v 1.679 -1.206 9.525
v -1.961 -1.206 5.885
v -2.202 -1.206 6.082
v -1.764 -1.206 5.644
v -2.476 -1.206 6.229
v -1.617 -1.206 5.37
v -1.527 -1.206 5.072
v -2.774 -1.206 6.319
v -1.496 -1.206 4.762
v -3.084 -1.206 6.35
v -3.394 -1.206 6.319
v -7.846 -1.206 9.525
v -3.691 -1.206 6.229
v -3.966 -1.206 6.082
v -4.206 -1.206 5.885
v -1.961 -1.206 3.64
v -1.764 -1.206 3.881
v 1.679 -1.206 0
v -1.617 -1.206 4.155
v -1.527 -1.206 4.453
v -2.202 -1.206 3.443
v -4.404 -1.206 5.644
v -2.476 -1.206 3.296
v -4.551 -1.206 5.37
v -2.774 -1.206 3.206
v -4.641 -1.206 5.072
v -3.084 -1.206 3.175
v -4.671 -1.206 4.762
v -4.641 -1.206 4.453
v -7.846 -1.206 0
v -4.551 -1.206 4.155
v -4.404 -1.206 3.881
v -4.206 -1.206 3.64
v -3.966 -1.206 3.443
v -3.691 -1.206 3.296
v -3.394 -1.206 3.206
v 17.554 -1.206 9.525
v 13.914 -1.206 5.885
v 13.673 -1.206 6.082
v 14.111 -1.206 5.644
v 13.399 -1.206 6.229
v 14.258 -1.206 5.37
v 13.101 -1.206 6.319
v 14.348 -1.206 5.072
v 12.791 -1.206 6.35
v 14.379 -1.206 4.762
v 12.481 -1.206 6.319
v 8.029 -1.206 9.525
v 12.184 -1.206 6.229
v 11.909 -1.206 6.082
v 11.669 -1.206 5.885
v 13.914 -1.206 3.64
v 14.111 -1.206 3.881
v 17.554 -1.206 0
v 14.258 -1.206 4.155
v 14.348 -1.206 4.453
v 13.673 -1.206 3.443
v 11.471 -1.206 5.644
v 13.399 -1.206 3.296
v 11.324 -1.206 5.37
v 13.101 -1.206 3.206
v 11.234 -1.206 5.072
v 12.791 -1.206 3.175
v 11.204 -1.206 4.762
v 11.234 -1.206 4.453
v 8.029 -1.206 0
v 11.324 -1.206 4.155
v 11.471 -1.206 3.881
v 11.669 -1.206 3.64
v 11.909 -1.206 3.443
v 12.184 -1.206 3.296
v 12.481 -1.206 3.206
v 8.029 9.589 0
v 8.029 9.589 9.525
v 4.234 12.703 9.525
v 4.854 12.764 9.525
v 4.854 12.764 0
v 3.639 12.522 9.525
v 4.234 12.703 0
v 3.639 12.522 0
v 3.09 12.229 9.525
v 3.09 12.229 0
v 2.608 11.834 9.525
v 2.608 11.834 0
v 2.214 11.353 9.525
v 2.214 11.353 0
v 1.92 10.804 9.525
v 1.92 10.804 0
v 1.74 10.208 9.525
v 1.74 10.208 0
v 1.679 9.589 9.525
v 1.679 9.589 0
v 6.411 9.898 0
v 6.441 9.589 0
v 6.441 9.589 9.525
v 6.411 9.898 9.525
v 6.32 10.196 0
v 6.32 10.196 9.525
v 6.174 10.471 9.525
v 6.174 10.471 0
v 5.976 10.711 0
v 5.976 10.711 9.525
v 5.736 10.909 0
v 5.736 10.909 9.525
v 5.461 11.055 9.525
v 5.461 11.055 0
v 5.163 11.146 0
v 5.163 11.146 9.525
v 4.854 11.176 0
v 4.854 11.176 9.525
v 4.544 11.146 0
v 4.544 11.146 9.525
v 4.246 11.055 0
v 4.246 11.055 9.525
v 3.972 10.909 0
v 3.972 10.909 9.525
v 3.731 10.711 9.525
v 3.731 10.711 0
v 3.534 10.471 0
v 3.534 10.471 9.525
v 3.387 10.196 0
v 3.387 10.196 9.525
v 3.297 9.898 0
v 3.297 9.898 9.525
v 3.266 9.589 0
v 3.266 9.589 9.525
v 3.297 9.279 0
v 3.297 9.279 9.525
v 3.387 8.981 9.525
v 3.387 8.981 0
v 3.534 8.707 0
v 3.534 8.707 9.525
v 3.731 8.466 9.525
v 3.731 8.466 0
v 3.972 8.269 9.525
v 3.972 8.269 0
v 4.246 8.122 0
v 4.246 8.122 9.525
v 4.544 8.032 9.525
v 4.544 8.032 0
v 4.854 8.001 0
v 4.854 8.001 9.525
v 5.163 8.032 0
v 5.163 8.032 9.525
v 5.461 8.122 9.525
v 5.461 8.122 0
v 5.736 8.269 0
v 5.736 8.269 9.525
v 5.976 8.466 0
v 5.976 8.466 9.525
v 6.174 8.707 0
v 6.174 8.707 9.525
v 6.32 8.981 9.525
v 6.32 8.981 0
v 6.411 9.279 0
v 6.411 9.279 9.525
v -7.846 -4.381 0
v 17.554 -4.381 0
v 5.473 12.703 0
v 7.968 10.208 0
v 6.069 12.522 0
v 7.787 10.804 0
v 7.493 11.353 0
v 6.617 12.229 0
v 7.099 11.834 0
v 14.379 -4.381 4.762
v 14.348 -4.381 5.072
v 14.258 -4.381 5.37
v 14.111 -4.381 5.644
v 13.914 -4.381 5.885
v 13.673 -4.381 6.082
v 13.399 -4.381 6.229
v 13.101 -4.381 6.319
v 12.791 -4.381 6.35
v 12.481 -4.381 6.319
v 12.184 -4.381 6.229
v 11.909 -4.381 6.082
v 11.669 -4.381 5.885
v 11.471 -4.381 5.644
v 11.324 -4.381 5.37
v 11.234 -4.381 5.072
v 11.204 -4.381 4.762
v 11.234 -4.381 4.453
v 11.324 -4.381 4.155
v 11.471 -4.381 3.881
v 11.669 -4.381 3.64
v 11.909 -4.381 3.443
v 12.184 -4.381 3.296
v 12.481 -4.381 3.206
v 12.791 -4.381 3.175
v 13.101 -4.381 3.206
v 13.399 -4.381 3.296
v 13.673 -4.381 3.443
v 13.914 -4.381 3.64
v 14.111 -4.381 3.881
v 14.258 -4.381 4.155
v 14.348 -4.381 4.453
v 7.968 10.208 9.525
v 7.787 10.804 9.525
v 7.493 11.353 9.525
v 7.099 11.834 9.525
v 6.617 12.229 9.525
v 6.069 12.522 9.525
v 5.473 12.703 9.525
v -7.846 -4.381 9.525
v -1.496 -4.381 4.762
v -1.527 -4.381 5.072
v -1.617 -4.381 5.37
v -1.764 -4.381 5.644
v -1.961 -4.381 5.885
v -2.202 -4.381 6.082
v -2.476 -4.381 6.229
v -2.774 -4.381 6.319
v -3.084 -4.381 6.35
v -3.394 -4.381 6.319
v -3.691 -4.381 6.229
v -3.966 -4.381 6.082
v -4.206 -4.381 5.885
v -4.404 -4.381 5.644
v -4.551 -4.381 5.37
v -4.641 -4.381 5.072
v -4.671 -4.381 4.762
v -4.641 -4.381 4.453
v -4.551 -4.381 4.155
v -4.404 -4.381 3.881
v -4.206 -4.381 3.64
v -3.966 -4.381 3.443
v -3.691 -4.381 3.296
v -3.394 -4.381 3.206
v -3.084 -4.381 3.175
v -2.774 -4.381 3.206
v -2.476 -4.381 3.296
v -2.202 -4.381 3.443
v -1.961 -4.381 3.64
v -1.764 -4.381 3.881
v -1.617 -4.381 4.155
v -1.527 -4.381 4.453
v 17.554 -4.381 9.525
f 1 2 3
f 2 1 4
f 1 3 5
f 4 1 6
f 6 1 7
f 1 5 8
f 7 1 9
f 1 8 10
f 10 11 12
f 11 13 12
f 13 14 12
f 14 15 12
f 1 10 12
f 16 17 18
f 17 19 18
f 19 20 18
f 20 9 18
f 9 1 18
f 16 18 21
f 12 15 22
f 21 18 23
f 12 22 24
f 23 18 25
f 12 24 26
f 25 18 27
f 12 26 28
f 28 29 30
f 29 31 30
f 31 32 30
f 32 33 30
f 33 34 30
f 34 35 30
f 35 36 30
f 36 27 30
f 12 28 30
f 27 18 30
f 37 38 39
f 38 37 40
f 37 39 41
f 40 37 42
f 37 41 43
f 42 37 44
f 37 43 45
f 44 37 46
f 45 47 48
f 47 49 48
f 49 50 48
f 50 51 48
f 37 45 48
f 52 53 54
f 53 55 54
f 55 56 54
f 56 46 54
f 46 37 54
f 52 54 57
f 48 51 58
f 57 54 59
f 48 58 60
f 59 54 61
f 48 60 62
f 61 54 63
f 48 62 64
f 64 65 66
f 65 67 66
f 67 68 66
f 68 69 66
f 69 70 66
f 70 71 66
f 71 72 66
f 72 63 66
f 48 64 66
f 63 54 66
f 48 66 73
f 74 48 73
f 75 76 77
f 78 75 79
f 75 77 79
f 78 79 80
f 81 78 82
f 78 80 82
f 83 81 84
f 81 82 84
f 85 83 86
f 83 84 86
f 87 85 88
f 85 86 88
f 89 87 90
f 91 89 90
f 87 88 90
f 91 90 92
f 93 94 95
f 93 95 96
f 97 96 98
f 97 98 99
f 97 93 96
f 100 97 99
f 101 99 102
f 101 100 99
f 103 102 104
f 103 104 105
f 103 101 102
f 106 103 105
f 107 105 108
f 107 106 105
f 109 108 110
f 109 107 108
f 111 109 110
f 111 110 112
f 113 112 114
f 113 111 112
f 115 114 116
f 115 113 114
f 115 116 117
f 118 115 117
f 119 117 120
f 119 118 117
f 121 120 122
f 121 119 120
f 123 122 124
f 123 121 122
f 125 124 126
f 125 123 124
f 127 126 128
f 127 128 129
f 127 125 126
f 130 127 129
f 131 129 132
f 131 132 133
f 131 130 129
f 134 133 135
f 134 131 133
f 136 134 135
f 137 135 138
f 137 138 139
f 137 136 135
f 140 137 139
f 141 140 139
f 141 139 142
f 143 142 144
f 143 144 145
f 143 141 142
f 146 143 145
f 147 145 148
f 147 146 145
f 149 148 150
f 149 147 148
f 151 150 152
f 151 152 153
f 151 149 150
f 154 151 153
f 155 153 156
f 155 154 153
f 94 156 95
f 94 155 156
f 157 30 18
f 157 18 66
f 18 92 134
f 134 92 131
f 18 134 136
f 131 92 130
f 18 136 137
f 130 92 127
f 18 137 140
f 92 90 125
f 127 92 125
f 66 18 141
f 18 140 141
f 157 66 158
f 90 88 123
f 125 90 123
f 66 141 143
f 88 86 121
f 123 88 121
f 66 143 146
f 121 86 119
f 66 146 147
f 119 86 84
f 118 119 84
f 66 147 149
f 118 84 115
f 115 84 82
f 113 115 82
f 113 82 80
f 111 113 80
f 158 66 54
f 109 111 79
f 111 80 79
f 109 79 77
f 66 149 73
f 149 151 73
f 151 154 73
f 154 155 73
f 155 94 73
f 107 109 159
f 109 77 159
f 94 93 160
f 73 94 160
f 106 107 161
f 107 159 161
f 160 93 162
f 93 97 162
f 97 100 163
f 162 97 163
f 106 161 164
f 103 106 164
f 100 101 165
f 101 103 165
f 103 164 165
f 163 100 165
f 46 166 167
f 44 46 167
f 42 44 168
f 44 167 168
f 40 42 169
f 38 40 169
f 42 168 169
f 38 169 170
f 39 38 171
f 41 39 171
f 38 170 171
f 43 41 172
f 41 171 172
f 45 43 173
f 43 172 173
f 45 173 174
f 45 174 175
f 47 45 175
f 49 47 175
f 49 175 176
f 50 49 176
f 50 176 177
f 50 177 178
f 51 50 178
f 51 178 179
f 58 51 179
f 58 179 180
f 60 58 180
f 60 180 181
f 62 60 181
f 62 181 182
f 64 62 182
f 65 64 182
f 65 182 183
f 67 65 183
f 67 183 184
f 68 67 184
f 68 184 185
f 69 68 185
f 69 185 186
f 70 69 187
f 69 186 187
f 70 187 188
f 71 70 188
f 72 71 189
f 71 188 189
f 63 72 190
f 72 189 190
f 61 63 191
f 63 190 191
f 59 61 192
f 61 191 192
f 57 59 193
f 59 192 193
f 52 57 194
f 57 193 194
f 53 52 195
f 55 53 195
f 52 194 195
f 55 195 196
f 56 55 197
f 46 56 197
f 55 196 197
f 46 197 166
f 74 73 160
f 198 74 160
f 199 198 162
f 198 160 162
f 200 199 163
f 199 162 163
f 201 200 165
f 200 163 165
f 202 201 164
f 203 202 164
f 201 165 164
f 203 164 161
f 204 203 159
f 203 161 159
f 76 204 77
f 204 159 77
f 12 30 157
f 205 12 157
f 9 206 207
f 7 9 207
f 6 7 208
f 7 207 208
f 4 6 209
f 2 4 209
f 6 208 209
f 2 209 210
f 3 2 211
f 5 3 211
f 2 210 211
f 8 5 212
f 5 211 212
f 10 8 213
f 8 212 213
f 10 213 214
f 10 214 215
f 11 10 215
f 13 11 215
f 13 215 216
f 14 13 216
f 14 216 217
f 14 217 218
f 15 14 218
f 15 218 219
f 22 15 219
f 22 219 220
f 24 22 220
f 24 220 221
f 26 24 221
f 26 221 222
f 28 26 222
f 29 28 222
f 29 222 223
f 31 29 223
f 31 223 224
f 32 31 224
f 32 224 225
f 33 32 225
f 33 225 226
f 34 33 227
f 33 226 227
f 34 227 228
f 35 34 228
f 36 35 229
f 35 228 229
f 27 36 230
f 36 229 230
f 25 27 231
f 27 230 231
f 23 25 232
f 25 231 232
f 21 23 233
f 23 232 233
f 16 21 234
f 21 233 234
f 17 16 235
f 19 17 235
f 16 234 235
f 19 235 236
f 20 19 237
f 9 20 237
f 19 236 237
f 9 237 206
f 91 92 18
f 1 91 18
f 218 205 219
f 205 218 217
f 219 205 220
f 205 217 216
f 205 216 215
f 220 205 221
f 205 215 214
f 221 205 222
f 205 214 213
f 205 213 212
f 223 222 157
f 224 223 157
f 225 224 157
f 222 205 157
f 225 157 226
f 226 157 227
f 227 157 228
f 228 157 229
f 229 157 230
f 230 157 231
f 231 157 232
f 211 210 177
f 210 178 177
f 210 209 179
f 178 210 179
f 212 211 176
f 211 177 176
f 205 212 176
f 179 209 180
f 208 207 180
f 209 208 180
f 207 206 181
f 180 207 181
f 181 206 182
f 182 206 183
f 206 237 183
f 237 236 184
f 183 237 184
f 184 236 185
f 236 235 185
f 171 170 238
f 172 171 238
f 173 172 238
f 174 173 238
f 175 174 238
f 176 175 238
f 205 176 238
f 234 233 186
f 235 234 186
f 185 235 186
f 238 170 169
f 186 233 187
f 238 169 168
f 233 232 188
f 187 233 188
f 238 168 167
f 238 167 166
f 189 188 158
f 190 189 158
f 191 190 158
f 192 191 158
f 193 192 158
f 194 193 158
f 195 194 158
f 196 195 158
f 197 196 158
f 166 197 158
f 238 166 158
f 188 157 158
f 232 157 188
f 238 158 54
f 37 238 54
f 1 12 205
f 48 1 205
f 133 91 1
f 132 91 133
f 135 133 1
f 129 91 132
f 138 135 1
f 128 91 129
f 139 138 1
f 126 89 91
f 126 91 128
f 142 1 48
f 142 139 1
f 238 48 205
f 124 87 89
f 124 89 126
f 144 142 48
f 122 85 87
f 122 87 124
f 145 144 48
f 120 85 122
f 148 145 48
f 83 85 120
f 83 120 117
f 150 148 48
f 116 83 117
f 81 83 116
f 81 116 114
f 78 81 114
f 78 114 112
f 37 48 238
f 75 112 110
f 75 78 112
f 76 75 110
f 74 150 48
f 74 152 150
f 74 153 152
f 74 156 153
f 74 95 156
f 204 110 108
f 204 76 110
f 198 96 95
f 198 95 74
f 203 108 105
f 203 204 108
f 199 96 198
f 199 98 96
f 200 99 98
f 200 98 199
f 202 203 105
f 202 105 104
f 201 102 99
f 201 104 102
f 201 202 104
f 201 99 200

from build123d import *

# Parameters (mm, degrees)
F0_R     = 1.5875
F1_DEPTH = 9.525
F3_D     = 3.175
F5_D     = 3.175


# Not quite as in the source:
# - a length typed as a fraction of an inch, garbled in the dataset ("3 / 203.2 mm" for 3/8 in), is restored


with BuildPart() as f1:
    # F0 (on Top) → F1 (new body)
    with BuildSketch(Plane.XY):
        with BuildLine():
            Line((1.6785456881, 9.5886874095), (1.6785456881, -1.2063125905))
            Line((1.6785456881, -1.2063125905), (8.0285456881, -1.2063125905))
            Line((8.0285456881, -1.2063125905), (8.0285456881, 9.5886874095))
            ThreePointArc((8.0285456881, 9.5886874095), (7.0986097184, 11.8337514397), (4.8535456881, 12.7636874095))
            ThreePointArc((4.8535456881, 12.7636874095), (2.6084816578, 11.8337514397), (1.6785456881, 9.5886874095))
        make_face()
        with Locations((4.8535456881, 9.5886874095)):
            Circle(F0_R, mode=Mode.SUBTRACT)
        Polygon((-7.8464543119, -1.2063125905), (-7.8464543119, -4.3813125905), (17.5535456881, -4.3813125905), (17.5535456881, -1.2063125905), (8.0285456881, -1.2063125905), (1.6785456881, -1.2063125905), align=None)
    extrude(amount=F1_DEPTH)

    # F3 (through all)
    with Locations(Plane(origin=(0, -1.2063125905, 0), x_dir=(-1, 0, 0), z_dir=(0, 1, 0))):
        with Locations((-12.7910456881, 4.7625)):
            Hole(F3_D / 2)

    # F5 (through all)
    with Locations(Plane(origin=(0, -1.2063125905, 0), x_dir=(-1, 0, 0), z_dir=(0, 1, 0))):
        with Locations((3.0839543119, 4.7625)):
            Hole(F5_D / 2)


solid = f1.part
